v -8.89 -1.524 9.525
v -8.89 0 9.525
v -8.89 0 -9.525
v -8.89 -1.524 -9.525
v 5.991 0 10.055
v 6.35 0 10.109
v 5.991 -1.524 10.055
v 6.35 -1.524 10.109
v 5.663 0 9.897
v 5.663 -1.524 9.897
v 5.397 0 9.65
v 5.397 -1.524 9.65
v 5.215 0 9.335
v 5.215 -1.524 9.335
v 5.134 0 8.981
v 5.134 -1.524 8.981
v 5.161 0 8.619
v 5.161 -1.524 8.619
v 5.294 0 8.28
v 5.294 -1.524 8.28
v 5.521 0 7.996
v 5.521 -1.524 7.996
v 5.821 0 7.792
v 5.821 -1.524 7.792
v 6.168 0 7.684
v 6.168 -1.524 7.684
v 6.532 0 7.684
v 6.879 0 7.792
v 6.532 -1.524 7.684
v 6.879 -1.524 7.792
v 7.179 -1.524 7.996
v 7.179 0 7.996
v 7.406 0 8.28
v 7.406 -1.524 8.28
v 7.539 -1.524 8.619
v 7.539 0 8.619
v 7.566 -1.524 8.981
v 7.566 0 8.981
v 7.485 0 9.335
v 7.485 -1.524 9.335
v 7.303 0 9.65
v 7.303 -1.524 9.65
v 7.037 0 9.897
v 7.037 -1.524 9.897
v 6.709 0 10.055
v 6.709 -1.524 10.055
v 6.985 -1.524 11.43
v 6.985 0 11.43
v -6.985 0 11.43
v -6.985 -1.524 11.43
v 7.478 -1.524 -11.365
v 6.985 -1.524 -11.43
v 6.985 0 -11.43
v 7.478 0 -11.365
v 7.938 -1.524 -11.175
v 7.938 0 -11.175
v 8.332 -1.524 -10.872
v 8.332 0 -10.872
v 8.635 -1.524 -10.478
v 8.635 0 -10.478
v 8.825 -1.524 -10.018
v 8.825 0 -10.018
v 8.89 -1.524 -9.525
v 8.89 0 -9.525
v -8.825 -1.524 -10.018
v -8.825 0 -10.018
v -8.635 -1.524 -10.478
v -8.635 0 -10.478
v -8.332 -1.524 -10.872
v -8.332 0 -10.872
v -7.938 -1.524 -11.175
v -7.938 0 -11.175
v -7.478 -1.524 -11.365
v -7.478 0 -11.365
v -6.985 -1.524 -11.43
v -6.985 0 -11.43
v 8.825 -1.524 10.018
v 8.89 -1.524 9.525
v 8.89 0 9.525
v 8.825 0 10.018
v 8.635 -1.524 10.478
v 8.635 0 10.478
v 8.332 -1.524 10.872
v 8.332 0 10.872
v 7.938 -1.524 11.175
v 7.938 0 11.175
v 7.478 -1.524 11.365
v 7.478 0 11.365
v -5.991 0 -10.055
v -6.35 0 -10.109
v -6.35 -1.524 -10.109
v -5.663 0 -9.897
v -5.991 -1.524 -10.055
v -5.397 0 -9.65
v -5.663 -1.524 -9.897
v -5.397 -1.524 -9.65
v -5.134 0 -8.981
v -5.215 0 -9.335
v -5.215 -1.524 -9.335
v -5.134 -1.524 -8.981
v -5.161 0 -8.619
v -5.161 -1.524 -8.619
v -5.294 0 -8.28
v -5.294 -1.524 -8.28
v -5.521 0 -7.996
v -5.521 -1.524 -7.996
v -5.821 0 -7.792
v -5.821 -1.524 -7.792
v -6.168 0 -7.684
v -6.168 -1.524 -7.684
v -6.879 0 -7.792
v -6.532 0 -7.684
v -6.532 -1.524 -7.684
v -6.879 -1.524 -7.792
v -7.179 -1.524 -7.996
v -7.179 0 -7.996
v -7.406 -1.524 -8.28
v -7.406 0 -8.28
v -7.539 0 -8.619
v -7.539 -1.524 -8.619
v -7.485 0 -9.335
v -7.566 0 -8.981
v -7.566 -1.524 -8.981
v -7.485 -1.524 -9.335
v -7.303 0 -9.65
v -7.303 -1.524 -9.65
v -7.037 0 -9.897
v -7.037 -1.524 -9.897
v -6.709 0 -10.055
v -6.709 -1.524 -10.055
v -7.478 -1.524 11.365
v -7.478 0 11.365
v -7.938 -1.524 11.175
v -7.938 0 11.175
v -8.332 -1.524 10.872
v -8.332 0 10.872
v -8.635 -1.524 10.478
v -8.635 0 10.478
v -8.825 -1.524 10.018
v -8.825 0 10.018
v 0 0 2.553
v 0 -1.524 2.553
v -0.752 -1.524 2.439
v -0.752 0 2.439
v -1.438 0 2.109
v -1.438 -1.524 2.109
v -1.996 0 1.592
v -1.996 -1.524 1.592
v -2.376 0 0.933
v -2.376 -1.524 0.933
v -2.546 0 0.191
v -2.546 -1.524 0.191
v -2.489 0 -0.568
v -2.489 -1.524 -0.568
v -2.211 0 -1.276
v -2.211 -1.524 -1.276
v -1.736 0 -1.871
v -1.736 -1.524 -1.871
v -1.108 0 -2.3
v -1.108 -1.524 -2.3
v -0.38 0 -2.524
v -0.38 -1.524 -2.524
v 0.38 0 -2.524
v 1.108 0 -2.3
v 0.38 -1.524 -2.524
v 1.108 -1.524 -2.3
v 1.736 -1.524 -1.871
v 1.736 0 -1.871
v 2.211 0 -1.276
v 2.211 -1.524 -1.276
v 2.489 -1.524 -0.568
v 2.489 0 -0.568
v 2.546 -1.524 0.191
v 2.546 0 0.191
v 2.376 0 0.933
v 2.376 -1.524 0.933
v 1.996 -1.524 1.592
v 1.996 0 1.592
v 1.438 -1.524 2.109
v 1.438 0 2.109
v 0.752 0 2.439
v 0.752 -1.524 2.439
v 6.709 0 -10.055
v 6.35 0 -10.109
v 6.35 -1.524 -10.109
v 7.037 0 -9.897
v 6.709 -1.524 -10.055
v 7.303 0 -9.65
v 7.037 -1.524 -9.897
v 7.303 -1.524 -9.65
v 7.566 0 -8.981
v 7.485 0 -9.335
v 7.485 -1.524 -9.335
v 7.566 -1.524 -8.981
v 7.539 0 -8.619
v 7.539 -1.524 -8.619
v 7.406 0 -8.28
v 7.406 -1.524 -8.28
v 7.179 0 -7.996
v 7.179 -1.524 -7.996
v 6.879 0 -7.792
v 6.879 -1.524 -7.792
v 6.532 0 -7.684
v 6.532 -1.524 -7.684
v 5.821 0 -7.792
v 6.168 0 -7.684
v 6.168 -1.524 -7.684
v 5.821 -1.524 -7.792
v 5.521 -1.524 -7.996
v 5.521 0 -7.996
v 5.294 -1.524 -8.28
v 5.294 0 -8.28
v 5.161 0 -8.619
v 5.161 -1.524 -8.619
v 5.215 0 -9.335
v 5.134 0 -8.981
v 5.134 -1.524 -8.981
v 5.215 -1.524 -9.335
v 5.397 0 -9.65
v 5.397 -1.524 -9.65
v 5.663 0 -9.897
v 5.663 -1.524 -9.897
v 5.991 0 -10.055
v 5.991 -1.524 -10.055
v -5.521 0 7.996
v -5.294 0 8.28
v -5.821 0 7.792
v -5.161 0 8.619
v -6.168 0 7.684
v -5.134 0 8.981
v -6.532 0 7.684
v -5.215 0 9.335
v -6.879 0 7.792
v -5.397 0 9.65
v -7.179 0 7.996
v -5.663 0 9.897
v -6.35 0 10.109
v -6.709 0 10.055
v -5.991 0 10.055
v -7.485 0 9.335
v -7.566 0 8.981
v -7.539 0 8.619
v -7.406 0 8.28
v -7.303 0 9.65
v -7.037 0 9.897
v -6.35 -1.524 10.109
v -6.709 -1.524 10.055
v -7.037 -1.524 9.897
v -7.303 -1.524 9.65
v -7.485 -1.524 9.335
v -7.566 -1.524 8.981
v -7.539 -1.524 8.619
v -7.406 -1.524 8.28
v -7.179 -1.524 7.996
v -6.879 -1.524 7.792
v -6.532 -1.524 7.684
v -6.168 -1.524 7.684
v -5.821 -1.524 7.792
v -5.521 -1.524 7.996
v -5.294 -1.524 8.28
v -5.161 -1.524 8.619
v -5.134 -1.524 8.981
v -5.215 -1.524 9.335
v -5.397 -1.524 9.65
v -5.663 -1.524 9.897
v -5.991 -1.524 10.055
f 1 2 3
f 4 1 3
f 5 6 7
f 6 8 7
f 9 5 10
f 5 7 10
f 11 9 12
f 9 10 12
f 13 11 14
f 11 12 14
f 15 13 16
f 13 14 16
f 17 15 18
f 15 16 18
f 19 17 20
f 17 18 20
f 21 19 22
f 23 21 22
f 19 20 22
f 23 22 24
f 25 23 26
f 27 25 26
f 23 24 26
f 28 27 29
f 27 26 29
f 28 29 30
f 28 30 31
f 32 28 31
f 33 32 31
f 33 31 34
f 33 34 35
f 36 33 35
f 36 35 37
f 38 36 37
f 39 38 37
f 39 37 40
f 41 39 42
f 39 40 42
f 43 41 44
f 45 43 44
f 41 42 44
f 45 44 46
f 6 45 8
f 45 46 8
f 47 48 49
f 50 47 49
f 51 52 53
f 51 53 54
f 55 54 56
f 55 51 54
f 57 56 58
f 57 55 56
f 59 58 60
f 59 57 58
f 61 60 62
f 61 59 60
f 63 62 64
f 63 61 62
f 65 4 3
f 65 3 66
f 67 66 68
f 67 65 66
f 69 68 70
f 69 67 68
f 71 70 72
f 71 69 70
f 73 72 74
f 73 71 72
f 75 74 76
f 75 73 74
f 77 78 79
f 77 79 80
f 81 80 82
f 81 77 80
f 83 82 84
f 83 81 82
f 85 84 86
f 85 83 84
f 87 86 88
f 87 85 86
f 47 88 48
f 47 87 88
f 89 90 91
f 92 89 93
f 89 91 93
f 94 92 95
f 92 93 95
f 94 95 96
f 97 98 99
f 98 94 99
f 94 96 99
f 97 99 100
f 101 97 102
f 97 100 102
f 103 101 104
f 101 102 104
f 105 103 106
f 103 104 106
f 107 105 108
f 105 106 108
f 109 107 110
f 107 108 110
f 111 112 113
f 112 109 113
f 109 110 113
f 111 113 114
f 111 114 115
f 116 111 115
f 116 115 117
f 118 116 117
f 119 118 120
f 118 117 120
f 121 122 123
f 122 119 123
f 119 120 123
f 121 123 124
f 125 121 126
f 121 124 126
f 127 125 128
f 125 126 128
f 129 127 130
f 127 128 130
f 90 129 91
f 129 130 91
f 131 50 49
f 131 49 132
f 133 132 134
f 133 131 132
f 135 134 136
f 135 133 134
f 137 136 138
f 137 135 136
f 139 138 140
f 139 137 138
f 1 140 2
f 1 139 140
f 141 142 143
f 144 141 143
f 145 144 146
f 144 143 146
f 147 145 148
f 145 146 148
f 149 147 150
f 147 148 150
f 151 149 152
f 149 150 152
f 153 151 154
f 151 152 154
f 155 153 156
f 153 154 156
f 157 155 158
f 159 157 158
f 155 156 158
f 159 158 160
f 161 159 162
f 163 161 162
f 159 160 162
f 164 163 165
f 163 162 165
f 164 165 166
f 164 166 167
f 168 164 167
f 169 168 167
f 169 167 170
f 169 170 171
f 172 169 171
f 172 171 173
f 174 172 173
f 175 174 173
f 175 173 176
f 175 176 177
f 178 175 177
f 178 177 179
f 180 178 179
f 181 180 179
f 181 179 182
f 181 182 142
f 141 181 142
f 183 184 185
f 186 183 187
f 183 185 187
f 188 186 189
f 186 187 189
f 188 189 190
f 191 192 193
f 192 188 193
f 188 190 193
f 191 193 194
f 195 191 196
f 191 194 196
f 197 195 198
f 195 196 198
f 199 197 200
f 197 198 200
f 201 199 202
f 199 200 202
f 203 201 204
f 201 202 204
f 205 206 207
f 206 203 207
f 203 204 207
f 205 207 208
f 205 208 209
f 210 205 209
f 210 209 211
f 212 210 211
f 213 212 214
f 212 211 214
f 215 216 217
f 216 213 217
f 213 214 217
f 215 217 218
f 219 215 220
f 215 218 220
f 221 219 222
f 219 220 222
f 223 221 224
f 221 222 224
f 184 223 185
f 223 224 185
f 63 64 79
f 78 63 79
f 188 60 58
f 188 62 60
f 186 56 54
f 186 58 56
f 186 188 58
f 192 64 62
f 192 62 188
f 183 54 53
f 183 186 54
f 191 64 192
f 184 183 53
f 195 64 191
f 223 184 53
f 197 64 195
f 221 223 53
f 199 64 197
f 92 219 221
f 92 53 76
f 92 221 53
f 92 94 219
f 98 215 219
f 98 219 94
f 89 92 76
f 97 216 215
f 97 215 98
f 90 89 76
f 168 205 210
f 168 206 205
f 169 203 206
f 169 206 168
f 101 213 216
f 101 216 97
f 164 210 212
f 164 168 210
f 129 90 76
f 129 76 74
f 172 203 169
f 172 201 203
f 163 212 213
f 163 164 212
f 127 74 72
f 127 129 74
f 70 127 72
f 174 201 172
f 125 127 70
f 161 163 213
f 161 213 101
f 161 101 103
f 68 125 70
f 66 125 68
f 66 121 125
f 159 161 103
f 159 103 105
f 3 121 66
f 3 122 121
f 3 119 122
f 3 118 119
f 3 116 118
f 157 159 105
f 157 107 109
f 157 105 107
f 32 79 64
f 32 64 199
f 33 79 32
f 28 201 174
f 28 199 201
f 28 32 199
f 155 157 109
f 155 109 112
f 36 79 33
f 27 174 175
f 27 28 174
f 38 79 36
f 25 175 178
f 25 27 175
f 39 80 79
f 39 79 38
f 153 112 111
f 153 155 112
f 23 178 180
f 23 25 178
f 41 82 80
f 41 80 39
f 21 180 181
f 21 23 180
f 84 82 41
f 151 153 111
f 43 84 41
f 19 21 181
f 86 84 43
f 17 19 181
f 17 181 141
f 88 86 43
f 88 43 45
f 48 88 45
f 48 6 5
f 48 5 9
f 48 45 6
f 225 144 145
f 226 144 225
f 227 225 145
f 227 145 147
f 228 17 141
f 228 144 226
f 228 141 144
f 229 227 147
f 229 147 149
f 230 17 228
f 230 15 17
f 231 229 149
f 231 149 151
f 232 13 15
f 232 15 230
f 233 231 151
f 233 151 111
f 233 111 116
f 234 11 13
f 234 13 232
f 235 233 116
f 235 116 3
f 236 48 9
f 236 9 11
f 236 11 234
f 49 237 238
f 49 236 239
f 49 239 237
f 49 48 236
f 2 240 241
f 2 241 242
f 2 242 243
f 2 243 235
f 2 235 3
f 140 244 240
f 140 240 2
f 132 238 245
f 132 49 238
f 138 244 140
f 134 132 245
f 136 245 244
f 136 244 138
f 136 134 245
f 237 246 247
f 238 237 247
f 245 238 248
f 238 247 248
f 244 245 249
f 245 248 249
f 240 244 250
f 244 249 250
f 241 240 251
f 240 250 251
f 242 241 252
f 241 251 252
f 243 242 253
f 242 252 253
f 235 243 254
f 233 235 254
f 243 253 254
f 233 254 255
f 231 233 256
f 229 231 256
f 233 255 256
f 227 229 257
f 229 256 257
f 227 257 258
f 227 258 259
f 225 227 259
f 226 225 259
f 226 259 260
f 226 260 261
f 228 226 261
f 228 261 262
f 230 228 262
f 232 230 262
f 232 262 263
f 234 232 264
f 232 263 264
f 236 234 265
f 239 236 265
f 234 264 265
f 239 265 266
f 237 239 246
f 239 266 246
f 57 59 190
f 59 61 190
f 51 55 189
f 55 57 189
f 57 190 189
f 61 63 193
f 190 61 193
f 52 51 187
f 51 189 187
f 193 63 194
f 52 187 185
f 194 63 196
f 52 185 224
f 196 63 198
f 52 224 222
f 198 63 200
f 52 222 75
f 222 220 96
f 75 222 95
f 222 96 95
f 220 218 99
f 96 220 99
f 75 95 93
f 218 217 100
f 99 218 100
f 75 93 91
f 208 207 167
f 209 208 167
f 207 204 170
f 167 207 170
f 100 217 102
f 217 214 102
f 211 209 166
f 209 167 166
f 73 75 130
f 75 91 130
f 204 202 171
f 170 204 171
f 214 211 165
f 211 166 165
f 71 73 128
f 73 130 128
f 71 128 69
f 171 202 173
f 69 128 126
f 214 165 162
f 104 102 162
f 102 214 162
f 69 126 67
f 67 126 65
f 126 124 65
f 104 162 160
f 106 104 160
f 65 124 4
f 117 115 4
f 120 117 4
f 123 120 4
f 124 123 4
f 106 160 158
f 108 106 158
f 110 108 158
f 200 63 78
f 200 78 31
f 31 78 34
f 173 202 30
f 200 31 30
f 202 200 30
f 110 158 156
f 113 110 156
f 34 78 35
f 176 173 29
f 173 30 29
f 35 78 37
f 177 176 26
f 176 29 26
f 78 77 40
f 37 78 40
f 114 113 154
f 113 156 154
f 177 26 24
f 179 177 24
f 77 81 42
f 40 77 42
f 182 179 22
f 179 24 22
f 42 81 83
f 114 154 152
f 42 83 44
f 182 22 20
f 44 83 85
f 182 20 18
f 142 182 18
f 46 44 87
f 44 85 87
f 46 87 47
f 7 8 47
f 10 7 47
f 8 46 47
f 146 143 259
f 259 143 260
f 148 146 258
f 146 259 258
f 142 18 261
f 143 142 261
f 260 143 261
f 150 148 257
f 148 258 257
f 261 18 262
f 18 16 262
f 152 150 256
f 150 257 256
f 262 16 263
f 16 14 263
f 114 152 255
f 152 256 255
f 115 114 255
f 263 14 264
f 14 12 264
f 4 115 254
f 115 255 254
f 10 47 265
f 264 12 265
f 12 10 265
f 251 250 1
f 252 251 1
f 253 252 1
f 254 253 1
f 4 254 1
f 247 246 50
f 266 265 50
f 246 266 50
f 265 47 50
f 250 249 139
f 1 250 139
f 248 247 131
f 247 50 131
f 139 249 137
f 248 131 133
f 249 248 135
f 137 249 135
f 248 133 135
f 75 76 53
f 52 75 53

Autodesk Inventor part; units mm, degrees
ref_plane "YZ Plane" through (0, 0, 0) normal (1, 0, 0) x (0, 1, 0)
ref_plane "XZ Plane" through (0, 0, 0) normal (0, 1, 0) x (-1, 0, 0)
ref_plane "XY Plane" through (0, 0, 0) normal (0, 0, 1) x (1, 0, 0)
sketch "Sketch1" plane through (0, 0, 0) normal (0, 1, 0) x (-1, 0, 0)
  line L0 (0, -16.002) -> (0, 16.002) projected
  line L1 (-12.446, 0) -> (12.446, 0) projected
  line L2 (-8.89, 11.43) -> (8.89, 11.43)
  line L3 (8.89, 11.43) -> (8.89, -11.43)
  line L4 (8.89, -11.43) -> (-8.89, -11.43)
  line L5 (-8.89, -11.43) -> (-8.89, 11.43)
  line L6 (-8.89, 11.43) -> (8.89, -11.43) construction
  line L7 (8.89, 11.43) -> (-8.89, -11.43) construction
  point P0 (0, 0)
  point P1 (6.35, 8.89)
  point P2 (-6.35, 8.89)
  dimension "d0" = 6.35
  dimension "d1" = 6.35
  dimension "d23" = 22.86
  dimension "d24" = 17.78
  dimension "d25" = 8.89
extrude "Extrusion1" add sketch "Sketch1" against normal blind 1.524
hole "Hole1" at (-6.35, 0, 8.89) at (6.35, 0, 8.89) direction (0, -1, 0) diameter 2.4384 end through all clearance for "Socket Head Cap Screw" size "#2" standard "Ansi Unified Screw Threads"
sketch "Sketch2" plane through (0, -1.524, 0) normal (0, -1, 0) x (1, 0, 0)
  line L0 (0, 16.002) -> (0, -16.002) projected
  line L1 (-12.446, 0) -> (12.446, 0) projected
  line L2 (-6.477, -4.064) -> (6.477, -4.064)
  line L3 (6.477, -4.064) -> (6.477, 4.064)
  line L4 (6.477, 4.064) -> (-6.477, 4.064)
  line L5 (-6.477, 4.064) -> (-6.477, -4.064)
  line L6 (-6.477, -4.064) -> (6.477, 4.064) construction
  line L7 (6.477, -4.064) -> (-6.477, 4.064) construction
  point P0 (0, 0)
  dimension "d11" = 12.954
  dimension "d12" = 8.128
extrude "Extrusion2" [suppressed]
hole "Hole2" at (0, 0, 0) direction (0, -1, 0) diameter 5.1054 end through all clearance for "Socket Head Cap Screw" size "#10" standard "Ansi Unified Screw Threads"
fillet "Fillet1" radius 1.905 4 edges at (-8.89, -0.762, -11.43) (-8.89, -0.762, 11.43) (8.89, -0.762, 11.43) (8.89, -0.762, -11.43)
mirror "Mirror1" about plane through (0, 0, 0) normal (0, 0, 1) of "Hole1"
properties part number "J010354" material "STAINLESS STEEL, 304"
